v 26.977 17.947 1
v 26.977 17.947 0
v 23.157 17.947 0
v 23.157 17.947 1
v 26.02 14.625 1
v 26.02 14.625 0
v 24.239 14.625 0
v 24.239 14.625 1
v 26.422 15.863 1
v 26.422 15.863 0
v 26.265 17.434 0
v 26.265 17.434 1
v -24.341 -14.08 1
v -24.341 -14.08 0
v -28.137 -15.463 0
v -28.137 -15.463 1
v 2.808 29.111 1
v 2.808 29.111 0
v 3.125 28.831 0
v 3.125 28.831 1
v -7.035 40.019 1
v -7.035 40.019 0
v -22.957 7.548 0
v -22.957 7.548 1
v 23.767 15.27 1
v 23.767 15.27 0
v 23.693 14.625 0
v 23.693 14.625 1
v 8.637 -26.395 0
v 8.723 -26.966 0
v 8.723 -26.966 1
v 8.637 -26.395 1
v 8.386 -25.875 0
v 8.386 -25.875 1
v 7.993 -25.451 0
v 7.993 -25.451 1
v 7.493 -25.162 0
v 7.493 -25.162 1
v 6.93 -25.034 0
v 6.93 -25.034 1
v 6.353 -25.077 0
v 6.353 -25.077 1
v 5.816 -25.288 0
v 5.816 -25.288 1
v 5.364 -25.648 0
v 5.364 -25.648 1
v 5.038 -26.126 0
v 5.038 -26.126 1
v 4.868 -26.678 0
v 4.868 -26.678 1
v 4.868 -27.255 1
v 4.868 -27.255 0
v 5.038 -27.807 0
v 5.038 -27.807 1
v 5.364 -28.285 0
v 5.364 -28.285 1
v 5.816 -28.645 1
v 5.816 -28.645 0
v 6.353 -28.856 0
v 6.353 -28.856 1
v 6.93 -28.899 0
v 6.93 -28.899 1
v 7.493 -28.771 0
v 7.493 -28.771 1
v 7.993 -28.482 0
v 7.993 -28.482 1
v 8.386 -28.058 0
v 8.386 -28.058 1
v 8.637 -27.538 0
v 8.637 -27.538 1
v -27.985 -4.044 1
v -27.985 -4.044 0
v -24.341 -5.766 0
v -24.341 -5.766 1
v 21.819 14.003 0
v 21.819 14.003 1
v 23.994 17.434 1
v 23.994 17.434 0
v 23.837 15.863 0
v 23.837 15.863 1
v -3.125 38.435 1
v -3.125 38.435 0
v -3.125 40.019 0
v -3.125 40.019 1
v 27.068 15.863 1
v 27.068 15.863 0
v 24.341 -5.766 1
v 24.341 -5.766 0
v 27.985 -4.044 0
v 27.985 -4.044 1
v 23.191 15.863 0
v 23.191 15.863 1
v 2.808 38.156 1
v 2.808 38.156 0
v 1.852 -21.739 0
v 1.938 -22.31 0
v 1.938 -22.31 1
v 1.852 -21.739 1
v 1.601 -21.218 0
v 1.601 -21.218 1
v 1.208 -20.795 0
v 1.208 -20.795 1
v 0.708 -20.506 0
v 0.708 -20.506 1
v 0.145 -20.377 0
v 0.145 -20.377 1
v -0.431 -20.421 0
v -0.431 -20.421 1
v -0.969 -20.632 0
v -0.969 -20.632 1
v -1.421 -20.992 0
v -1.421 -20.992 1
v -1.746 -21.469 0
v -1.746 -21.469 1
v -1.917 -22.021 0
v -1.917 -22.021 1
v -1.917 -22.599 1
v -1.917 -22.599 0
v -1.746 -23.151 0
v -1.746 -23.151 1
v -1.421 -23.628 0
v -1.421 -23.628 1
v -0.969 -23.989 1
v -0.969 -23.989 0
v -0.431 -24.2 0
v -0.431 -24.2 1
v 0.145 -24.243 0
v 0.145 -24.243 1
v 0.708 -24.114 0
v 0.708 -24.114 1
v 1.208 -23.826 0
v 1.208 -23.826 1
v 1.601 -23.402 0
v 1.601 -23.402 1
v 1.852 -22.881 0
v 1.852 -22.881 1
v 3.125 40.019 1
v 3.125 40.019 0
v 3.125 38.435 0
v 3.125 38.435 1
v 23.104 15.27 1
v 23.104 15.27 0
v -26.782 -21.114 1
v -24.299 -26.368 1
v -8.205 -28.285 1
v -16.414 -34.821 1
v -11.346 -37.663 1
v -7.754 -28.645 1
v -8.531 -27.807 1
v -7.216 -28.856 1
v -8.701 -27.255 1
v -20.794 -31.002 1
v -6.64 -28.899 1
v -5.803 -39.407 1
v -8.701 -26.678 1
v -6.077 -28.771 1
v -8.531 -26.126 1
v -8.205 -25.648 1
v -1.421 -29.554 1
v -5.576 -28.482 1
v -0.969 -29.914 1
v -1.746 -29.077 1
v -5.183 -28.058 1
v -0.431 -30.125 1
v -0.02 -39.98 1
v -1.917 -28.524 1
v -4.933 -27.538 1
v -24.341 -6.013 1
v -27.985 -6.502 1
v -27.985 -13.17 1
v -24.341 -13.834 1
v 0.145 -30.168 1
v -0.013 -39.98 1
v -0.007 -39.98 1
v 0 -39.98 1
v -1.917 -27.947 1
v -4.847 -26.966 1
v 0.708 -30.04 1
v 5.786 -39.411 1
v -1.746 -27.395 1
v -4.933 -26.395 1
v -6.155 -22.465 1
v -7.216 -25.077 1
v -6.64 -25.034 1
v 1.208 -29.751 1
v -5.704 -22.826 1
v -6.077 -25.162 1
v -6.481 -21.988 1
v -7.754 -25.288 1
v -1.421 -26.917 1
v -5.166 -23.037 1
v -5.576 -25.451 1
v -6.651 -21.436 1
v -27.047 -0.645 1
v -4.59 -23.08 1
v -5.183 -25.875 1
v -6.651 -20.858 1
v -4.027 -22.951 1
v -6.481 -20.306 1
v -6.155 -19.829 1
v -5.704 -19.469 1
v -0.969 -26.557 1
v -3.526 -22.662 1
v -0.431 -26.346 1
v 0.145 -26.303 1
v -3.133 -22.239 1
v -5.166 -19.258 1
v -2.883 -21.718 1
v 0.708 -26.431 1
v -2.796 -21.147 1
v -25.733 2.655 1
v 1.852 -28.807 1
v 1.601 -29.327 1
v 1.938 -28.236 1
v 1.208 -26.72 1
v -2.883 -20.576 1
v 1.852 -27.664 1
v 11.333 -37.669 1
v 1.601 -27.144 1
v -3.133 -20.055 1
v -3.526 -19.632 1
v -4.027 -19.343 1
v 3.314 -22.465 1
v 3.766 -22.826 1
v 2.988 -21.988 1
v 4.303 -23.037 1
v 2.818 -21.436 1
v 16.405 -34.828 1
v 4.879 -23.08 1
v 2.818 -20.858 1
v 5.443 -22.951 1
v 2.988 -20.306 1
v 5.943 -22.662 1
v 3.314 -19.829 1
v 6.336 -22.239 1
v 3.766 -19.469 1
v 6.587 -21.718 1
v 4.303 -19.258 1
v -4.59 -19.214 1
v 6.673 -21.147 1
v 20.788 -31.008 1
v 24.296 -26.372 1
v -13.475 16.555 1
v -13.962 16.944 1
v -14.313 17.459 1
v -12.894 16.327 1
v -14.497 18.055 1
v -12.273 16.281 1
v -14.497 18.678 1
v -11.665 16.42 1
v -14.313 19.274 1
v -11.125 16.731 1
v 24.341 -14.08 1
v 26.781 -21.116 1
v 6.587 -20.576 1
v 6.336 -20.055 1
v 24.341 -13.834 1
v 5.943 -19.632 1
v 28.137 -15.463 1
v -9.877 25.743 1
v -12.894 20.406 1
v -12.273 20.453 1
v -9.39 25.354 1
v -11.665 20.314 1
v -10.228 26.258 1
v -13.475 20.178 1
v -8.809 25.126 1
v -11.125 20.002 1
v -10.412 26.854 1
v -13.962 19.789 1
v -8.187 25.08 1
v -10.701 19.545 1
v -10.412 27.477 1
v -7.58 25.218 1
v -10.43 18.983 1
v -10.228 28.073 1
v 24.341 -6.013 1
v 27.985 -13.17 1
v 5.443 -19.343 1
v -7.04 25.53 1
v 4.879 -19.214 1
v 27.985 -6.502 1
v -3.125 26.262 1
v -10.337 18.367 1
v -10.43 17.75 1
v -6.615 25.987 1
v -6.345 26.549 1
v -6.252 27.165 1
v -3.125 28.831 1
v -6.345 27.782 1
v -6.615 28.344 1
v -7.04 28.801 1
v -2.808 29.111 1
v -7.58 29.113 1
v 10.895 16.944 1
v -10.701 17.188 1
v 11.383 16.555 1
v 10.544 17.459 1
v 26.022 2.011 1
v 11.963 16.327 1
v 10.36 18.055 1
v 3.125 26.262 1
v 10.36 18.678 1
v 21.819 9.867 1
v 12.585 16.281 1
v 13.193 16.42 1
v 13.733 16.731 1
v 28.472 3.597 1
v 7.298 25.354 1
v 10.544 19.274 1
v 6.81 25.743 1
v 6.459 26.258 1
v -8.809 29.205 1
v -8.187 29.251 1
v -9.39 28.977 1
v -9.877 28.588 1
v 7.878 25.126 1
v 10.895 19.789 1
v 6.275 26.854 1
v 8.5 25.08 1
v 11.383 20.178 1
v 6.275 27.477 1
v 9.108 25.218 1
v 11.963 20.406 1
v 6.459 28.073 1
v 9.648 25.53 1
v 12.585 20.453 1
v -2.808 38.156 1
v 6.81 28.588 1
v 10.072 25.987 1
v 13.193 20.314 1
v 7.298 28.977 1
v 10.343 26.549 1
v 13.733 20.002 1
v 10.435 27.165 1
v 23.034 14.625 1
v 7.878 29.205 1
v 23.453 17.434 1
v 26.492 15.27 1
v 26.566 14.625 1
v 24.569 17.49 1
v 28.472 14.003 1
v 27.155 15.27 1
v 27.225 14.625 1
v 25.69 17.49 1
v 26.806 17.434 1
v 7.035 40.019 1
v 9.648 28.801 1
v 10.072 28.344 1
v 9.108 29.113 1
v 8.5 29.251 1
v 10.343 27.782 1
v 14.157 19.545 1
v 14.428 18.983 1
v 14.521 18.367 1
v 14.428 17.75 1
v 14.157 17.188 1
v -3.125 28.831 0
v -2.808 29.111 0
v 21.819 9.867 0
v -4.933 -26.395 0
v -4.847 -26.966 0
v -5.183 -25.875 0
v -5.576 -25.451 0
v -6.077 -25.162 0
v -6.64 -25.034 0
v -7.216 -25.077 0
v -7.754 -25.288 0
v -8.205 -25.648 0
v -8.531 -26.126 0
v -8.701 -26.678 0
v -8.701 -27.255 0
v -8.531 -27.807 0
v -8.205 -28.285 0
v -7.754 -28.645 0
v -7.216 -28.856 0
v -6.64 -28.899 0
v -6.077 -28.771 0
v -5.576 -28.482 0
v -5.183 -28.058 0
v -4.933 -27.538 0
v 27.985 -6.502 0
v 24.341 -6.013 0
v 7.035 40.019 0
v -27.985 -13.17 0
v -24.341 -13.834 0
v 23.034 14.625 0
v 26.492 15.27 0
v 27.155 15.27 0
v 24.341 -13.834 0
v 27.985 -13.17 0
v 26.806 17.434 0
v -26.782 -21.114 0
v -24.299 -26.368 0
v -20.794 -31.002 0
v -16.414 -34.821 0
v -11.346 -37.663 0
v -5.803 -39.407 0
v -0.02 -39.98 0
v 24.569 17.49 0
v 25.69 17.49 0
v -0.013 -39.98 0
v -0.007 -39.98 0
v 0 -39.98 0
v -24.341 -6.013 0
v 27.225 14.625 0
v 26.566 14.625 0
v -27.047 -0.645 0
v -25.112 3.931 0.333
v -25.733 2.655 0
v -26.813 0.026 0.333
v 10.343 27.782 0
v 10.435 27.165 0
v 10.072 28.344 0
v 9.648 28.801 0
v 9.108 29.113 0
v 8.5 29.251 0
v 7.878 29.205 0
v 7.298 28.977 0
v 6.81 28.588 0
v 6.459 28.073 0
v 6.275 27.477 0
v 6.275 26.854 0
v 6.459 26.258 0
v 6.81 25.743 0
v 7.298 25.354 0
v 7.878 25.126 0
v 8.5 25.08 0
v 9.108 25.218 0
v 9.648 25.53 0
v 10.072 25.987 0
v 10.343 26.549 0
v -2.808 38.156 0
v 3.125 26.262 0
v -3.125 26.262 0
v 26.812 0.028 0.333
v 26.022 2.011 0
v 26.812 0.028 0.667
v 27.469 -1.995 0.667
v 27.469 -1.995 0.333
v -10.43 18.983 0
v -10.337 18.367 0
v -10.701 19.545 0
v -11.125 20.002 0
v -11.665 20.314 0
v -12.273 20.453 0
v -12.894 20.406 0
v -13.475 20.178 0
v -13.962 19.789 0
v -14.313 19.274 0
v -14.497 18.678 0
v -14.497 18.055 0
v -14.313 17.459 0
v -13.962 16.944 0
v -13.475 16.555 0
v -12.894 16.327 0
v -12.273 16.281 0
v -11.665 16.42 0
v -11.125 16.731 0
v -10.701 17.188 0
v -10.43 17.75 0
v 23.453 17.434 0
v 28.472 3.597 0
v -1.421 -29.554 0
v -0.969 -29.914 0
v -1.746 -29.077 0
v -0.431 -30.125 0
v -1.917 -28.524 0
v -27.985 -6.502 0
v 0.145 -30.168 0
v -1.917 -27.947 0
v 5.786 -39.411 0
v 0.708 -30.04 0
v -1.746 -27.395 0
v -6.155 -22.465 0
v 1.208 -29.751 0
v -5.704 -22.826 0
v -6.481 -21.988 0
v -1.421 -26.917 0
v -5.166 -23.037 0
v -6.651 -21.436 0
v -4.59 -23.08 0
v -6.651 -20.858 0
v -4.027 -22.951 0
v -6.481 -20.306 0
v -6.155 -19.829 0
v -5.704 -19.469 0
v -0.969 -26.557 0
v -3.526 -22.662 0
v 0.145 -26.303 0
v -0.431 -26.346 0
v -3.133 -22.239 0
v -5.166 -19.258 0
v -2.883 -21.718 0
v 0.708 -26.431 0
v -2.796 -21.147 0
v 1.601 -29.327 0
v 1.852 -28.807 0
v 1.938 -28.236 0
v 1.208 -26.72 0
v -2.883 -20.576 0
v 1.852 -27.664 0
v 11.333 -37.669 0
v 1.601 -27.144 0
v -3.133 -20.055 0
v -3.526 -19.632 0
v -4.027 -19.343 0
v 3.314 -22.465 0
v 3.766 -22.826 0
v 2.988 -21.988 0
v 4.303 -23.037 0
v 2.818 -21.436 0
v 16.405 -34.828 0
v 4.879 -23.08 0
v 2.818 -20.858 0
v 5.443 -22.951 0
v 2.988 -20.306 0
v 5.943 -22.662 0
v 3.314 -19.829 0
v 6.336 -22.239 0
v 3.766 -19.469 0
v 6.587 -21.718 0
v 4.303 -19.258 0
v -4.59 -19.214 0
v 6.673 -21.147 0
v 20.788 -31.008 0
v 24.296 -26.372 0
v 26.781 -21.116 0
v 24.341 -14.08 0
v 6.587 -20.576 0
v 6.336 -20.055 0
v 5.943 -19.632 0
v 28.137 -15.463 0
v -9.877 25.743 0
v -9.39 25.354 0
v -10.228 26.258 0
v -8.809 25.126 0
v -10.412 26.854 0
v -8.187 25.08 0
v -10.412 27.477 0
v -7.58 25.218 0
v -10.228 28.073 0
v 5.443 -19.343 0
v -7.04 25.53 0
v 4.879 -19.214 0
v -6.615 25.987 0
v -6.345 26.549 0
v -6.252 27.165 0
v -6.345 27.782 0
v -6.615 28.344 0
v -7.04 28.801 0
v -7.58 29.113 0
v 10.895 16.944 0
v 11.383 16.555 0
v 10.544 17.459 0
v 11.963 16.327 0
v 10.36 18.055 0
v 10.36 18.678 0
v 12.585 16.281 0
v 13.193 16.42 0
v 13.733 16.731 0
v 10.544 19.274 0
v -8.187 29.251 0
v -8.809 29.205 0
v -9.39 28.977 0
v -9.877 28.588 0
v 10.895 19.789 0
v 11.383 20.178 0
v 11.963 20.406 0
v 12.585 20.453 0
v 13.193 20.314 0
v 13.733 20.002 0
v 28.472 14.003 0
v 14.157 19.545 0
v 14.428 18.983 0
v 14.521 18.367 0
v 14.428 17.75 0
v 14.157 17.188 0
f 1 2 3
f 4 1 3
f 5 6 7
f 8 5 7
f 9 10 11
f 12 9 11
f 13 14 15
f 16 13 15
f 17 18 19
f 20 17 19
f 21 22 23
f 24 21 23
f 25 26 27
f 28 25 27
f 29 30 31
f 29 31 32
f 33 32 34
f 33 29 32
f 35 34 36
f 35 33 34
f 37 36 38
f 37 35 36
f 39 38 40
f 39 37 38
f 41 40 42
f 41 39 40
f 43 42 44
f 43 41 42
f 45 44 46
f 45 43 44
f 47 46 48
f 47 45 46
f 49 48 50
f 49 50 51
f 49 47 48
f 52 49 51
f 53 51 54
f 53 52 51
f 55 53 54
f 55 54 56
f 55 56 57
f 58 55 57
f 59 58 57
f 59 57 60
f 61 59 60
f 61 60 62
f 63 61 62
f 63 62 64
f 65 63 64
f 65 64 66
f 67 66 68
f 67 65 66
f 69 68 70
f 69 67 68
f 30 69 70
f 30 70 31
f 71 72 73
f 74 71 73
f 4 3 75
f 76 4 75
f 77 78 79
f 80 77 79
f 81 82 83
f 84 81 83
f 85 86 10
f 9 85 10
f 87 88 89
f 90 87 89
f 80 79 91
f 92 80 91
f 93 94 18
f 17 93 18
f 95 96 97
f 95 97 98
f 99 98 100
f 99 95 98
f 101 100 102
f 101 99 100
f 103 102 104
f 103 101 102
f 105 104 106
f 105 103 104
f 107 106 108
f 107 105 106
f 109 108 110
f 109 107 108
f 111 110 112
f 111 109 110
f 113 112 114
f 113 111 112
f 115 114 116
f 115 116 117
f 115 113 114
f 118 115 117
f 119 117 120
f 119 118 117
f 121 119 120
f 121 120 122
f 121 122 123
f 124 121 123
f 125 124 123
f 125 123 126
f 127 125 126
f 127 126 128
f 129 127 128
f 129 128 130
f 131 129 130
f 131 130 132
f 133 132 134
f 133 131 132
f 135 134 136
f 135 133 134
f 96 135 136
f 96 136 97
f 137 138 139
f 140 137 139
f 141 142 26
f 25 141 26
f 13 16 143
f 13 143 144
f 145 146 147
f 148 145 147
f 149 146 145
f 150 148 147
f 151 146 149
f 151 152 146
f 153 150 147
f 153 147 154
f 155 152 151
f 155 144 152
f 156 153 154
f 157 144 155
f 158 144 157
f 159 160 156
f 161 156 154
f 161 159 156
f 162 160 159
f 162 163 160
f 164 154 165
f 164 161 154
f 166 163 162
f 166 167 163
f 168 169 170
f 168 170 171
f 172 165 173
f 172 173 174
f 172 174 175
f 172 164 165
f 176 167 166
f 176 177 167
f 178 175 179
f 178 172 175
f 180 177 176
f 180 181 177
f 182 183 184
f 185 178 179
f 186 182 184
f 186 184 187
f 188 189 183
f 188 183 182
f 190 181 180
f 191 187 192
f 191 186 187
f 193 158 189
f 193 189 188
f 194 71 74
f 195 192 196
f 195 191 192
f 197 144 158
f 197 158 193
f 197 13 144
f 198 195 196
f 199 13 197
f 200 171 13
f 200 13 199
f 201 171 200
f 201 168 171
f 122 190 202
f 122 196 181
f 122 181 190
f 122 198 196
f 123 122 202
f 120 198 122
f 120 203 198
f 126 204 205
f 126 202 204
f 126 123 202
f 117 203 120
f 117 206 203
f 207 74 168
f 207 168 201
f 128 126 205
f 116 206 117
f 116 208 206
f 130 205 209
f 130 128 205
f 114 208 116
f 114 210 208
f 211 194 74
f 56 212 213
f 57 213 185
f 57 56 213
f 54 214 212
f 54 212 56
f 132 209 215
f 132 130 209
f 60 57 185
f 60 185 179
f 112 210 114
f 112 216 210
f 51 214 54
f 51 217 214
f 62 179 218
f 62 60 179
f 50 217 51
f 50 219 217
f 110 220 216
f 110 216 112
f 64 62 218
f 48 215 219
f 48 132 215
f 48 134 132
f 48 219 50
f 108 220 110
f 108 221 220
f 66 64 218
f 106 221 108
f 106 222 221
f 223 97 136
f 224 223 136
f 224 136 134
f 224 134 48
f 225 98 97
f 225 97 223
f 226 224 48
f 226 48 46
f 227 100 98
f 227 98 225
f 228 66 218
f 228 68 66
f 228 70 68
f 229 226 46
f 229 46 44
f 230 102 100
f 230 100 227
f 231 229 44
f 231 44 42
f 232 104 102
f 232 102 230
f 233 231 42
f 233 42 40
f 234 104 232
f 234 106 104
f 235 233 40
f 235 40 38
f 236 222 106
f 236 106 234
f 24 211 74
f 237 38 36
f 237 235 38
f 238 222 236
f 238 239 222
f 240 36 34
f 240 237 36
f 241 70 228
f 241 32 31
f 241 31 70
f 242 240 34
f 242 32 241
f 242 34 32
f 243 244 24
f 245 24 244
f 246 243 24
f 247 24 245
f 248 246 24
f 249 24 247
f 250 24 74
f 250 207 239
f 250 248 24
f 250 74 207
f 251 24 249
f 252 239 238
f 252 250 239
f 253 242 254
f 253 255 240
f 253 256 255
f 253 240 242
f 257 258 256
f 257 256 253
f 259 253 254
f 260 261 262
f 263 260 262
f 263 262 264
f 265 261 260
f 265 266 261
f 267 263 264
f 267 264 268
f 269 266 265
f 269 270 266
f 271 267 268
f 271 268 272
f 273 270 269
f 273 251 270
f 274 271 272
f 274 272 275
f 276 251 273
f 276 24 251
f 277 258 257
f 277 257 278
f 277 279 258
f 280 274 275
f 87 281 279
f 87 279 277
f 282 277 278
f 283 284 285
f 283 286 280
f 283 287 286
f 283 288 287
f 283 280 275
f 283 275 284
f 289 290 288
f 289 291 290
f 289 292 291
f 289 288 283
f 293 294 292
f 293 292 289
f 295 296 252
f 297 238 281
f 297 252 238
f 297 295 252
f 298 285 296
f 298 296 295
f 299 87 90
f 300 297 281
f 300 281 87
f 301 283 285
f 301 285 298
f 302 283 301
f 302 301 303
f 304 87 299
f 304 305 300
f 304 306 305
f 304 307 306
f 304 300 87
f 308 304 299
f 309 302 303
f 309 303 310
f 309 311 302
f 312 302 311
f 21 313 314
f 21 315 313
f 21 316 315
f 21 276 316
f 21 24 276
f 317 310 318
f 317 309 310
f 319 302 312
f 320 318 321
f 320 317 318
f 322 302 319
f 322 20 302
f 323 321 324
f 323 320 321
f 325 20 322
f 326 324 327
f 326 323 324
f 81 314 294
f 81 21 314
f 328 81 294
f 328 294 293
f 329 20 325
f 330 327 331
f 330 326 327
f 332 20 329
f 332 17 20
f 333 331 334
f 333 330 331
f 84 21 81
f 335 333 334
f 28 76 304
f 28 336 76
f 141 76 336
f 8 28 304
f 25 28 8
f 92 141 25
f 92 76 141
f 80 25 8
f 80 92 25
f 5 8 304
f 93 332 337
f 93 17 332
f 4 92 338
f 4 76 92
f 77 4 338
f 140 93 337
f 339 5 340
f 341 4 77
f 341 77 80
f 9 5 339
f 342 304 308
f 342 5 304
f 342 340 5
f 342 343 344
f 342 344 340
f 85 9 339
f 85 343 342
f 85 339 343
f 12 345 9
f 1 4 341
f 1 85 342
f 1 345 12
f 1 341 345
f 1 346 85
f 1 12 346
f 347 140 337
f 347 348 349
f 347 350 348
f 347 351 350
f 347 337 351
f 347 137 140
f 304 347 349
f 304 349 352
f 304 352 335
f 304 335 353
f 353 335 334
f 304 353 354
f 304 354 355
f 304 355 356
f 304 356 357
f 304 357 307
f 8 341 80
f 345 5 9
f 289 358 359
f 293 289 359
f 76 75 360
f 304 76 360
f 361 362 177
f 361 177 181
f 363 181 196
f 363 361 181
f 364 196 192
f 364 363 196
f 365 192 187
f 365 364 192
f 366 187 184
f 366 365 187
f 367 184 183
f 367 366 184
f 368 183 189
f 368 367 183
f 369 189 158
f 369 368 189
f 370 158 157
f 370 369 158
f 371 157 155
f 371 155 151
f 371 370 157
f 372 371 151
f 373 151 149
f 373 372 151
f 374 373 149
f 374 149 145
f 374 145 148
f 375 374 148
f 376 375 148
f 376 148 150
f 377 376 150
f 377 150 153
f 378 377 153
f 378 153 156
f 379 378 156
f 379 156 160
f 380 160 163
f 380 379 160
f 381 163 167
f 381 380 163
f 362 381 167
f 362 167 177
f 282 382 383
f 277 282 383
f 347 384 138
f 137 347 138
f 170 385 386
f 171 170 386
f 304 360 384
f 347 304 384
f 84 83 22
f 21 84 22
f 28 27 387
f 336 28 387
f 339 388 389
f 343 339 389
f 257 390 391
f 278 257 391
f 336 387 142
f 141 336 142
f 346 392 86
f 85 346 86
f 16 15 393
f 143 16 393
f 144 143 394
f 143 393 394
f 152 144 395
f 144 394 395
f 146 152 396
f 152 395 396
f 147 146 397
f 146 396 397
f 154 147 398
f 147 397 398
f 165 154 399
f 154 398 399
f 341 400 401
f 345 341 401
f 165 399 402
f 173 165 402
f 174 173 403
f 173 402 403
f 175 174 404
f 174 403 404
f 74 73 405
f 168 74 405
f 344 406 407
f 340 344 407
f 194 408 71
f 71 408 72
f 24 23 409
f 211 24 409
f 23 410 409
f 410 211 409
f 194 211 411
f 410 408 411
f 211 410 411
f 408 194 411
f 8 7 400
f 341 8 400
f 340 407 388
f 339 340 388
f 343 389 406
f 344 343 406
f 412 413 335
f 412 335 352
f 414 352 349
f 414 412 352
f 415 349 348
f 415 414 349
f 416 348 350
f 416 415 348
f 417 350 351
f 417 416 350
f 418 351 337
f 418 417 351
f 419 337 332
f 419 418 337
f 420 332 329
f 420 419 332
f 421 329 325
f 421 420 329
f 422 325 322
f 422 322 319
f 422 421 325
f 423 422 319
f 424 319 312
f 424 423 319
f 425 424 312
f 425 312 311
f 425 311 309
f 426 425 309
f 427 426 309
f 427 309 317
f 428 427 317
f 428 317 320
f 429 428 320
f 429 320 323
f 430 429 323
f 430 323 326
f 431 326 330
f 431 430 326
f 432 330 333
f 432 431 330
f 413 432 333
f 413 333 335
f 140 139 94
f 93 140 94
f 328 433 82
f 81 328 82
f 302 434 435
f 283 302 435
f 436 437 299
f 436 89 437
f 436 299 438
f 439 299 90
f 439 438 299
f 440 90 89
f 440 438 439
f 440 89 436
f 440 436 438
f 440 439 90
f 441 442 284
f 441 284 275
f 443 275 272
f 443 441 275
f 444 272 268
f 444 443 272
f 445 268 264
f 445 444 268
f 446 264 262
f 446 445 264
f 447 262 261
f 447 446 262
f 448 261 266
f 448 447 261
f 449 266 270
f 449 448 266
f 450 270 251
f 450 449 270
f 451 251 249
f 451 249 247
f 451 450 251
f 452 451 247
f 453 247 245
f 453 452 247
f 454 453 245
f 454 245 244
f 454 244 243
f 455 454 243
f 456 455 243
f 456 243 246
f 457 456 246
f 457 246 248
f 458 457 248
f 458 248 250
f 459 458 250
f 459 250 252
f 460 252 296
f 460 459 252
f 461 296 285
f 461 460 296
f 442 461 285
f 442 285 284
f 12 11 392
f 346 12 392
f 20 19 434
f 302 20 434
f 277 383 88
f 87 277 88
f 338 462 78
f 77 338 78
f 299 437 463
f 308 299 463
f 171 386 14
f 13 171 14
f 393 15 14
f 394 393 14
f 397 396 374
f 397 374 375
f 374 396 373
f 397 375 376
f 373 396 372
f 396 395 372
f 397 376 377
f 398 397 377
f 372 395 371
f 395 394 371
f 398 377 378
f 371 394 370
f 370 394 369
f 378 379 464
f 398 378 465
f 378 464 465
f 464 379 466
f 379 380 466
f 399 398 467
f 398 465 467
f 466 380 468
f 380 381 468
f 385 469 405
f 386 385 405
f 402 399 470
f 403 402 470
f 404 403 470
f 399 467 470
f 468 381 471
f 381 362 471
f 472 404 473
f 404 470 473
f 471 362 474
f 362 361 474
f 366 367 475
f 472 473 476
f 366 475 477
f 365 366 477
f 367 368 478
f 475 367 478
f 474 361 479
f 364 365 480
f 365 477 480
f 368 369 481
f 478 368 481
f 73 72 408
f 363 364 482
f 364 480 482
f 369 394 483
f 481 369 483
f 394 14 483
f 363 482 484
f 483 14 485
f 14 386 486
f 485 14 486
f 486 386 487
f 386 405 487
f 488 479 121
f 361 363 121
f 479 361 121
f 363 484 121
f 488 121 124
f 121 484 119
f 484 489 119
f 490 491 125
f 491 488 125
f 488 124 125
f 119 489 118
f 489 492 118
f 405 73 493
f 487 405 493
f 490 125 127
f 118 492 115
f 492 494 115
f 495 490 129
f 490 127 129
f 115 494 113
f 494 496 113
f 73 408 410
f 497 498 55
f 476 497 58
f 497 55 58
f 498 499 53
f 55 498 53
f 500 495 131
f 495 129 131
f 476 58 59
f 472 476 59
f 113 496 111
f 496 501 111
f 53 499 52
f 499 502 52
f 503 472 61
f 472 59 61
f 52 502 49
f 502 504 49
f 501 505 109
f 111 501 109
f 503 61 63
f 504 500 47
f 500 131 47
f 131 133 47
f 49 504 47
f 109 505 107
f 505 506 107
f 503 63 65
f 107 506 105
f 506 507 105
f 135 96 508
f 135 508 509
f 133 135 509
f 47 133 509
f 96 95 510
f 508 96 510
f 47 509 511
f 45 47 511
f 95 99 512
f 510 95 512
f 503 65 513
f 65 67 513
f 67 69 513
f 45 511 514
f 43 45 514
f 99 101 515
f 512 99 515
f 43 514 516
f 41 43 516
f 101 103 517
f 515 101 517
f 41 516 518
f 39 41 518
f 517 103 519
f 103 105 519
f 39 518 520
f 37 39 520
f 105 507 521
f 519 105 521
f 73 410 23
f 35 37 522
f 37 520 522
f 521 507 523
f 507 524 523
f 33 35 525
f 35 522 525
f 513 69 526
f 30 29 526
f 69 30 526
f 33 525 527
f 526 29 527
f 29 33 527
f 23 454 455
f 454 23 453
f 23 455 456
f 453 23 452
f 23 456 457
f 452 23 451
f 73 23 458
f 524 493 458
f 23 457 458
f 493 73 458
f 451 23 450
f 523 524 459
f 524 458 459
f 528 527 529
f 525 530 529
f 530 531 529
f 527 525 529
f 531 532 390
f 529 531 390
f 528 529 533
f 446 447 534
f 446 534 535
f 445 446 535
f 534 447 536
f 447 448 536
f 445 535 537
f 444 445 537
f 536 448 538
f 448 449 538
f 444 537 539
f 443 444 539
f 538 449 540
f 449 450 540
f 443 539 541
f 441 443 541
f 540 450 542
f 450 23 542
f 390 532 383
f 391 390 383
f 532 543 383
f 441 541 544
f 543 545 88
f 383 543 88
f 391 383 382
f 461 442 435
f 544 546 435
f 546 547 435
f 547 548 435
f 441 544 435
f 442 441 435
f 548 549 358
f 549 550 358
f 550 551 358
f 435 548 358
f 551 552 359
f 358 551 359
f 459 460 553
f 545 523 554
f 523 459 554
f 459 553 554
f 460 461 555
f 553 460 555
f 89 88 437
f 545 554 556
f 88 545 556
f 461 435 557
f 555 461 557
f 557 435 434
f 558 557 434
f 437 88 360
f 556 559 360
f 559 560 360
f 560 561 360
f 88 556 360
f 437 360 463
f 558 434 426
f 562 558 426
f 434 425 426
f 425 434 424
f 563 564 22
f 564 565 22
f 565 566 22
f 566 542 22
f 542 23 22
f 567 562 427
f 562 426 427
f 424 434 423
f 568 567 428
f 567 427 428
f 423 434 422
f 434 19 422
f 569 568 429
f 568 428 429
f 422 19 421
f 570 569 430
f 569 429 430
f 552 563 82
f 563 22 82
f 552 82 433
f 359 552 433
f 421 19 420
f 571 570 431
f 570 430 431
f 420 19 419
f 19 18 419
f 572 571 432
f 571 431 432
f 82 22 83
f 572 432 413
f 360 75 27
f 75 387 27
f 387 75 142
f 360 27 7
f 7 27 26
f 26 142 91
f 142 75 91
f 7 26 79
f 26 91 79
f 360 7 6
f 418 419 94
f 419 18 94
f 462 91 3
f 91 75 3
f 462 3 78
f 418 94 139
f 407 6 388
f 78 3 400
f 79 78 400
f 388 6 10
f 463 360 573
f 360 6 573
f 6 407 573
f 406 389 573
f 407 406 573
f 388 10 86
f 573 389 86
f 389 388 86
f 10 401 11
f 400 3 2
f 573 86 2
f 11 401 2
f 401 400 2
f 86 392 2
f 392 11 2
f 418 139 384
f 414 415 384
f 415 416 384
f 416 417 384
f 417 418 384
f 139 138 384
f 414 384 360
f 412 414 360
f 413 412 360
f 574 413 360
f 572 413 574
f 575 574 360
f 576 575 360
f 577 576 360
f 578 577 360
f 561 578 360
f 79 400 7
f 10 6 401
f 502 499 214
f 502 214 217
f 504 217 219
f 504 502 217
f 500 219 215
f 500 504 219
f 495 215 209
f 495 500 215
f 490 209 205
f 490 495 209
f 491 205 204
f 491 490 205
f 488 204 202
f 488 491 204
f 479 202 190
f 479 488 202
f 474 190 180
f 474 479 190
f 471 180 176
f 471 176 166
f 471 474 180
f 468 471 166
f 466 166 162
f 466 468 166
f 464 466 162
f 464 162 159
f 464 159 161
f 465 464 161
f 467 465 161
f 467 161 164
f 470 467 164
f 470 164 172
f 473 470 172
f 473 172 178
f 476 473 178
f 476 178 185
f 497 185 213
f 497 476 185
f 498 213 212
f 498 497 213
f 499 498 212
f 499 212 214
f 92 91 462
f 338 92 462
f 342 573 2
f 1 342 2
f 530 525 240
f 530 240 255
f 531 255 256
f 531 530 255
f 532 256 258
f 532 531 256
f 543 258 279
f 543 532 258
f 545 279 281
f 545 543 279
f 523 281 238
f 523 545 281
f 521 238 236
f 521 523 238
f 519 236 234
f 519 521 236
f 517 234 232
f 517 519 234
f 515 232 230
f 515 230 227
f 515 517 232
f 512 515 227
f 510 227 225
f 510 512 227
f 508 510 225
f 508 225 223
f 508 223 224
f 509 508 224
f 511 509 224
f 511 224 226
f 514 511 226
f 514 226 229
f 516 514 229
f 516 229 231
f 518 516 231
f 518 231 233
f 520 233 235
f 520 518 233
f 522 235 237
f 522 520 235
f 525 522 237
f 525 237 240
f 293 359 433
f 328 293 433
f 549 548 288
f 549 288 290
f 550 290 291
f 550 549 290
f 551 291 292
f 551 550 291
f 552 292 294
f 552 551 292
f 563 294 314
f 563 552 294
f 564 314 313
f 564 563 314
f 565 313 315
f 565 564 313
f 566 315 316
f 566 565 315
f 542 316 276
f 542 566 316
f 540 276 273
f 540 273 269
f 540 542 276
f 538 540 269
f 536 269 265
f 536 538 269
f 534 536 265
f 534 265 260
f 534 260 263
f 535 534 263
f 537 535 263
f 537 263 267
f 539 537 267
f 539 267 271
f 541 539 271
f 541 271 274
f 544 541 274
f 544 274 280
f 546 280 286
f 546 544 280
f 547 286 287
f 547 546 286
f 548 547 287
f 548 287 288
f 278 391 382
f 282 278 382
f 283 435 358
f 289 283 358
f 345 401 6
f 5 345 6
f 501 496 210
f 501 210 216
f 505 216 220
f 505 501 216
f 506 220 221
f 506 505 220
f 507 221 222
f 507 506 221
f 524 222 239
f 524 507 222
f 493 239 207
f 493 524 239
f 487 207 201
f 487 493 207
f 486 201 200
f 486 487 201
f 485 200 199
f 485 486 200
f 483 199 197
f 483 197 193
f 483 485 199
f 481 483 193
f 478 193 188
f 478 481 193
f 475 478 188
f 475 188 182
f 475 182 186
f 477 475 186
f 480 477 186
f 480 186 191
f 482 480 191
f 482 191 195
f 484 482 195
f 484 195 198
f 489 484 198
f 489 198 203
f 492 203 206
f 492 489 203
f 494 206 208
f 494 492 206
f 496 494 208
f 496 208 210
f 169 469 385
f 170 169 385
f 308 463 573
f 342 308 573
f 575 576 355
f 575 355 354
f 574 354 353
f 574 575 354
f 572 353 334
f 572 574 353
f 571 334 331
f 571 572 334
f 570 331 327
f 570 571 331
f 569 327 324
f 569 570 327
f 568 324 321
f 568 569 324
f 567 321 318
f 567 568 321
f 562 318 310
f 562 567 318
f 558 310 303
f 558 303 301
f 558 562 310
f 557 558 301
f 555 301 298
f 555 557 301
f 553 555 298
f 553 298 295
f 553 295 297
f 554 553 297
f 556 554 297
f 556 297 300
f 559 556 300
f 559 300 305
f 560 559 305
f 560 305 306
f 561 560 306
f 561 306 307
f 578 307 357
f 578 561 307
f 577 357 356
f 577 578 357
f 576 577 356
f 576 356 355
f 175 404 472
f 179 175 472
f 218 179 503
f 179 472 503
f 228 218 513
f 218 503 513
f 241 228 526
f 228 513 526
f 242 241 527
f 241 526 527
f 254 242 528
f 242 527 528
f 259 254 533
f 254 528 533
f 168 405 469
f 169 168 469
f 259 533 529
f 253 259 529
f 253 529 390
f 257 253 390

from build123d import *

# Parameters (mm, degrees)
F0_R     = 1.9381566851
F0_R_2   = 2.0917368597
F1_DEPTH = 1


# Not quite as in the source:
# - a feature names something its author has since deleted; it is built from what else it names


with BuildPart() as f1:
    # F0 (on Top) → F1 (new body)
    with BuildSketch(Plane.XY):
        with BuildLine():
            Line((3.1245559464, 26.2624721611), (-1.08e-08, 26.2624721611))
            Line((-1.08e-08, 26.2624721611), (-3.124555968, 26.2624721611))
            Line((-3.124555968, 26.2624721611), (-3.124555968, 28.8313598976))
            Line((-3.124555968, 28.8313598976), (-3.124555968, 38.4353779081))
            Line((-3.124555968, 38.4353779081), (-3.124555968, 40.0192436593))
            Line((-3.124555968, 40.0192436593), (-7.0351105106, 40.0192436593))
            Line((-7.0351105106, 40.0192436593), (-22.9566536529, 7.5476728616))
            add(Edge.make_bspline(
                [(-22.9566536529, 7.5476728616), (-25.3127067939, 4.1178797379), (-27.103694983, 0.0661364302), (-27.9845091561, -4.0443276364)],
                knots=[0, 0, 0, 0, 12.635418731, 12.635418731, 12.635418731, 12.635418731], degree=3))
            Line((-27.9845091561, -4.0443276364), (-24.3406626732, -5.7663835679))
            Line((-24.3406626732, -5.7663835679), (-24.3406626732, -6.0127781864))
            Line((-24.3406626732, -6.0127781864), (-27.9845091561, -6.501597853))
            Line((-27.9845091561, -6.501597853), (-27.9845091561, -13.1704901951))
            Line((-27.9845091561, -13.1704901951), (-24.3406626732, -13.83388813))
            Line((-24.3406626732, -13.83388813), (-24.3406626732, -14.0802827486))
            Line((-24.3406626732, -14.0802827486), (-28.1370117447, -15.4628727929))
            ThreePointArc((-28.1370117447, -15.4628727929), (-18.7026452725, -33.0246464869), (-0.0200514, -39.9804967013))
            ThreePointArc((-0.0200514, -39.9804967013), (-0.0100256971, -39.9804519319), (-1.08e-08, -39.9804036034))
            ThreePointArc((-1.08e-08, -39.9804036034), (18.6950876239, -33.0312342783), (28.1370117231, -15.4628727929))
            Line((28.1370117231, -15.4628727929), (24.3406626516, -14.0802827486))
            Line((24.3406626516, -14.0802827486), (24.3406626516, -13.8338881301))
            Line((24.3406626516, -13.8338881301), (27.9845091345, -13.1704901951))
            Line((27.9845091345, -13.1704901951), (27.9845091345, -6.501597853))
            Line((27.9845091345, -6.501597853), (24.3406626516, -6.0127781865))
            Line((24.3406626516, -6.0127781865), (24.3406626516, -5.7663835679))
            Line((24.3406626516, -5.7663835679), (27.9845091345, -4.0443276364))
            add(Edge.make_bspline(
                [(26.0221502825, 2.0106991689), (26.8752917045, 0.0540824437), (27.5438186439, -1.9877730517), (27.9845091345, -4.0443276364)],
                knots=[6.3136438899, 6.3136438899, 6.3136438899, 6.3136438899, 12.635418731, 12.635418731, 12.635418731, 12.635418731], degree=3))
            add(Edge.make_bspline(
                [(22.9566536312, 7.5476728616), (24.1339221361, 5.8338798437), (25.1701061555, 3.9647993294), (26.0221502825, 2.0106991689)],
                knots=[0, 0, 0, 0, 6.3136438899, 6.3136438899, 6.3136438899, 6.3136438899], degree=3))
            Line((22.9566536312, 7.5476728616), (21.8193497392, 9.8671744024))
            Line((21.8193497392, 9.8671744024), (7.035110489, 40.0192436593))
            Line((7.035110489, 40.0192436593), (3.1245559464, 40.0192436593))
            Line((3.1245559464, 40.0192436593), (3.1245559464, 38.4353779081))
            Line((3.1245559464, 38.4353779081), (3.1245559464, 28.8313598976))
            Line((3.1245559464, 28.8313598976), (3.1245559464, 26.2624721611))
        make_face()
        with Locations((-6.7846685267, -26.966459513)):
            Circle(F0_R, mode=Mode.SUBTRACT)
        with Locations((-1.08e-08, -28.2356044358)):
            Circle(F0_R, mode=Mode.SUBTRACT)
        with Locations((-4.7346279243, -21.1471724542)):
            Circle(F0_R, mode=Mode.SUBTRACT)
        with Locations((-1.08e-08, -22.3102177961)):
            Circle(F0_R, mode=Mode.SUBTRACT)
        with Locations((6.784668505, -26.966459513)):
            Circle(F0_R, mode=Mode.SUBTRACT)
        with Locations((4.7346279027, -21.1471724542)):
            Circle(F0_R, mode=Mode.SUBTRACT)
        with Locations((-12.4288502443, 18.366707164)):
            Circle(F0_R_2, mode=Mode.SUBTRACT)
        with Locations((-8.3437176479, 27.1654560115)):
            Circle(F0_R_2, mode=Mode.SUBTRACT)
        with Locations((12.4288502227, 18.366707164)):
            Circle(F0_R_2, mode=Mode.SUBTRACT)
        with Locations((8.3437176263, 27.1654560115)):
            Circle(F0_R_2, mode=Mode.SUBTRACT)
        with BuildLine():
            Line((21.8193497392, 14.0026268734), (21.8193497392, 9.8671744024))
            Line((21.8193497392, 9.8671744024), (22.9566536312, 7.5476728616))
            add(Edge.make_bspline(
                [(22.9566536312, 7.5476728616), (24.1339221361, 5.8338798437), (25.1701061555, 3.9647993294), (26.0221502825, 2.0106991689)],
                knots=[0, 0, 0, 0, 6.3136438899, 6.3136438899, 6.3136438899, 6.3136438899], degree=3))
            Line((26.0221502825, 2.0106991689), (28.4720553036, 3.5966005617))
            Line((28.4720553036, 3.5966005617), (28.4720553036, 14.0026268734))
            Line((28.4720553036, 14.0026268734), (26.9772648538, 17.9472138793))
            Line((26.9772648538, 17.9472138793), (23.1570666214, 17.9472138793))
            Line((23.1570666214, 17.9472138793), (21.8193497392, 14.0026268734))
        make_face()
        Polygon((23.0341097003, 14.6254569428), (23.103940836, 15.2695124223), (23.7673383417, 15.2695124223), (23.6930889239, 14.6254569428), align=None, mode=Mode.SUBTRACT)
        Polygon((27.2249650291, 14.6254569428), (26.5659858056, 14.6254569428), (26.4917363877, 15.2695124223), (27.1551338935, 15.2695124223), align=None, mode=Mode.SUBTRACT)
        Polygon((23.1912288972, 15.8630787924), (23.4530965144, 17.4342844956), (23.9942903911, 17.4342844956), (23.8371694774, 15.8630787924), align=None, mode=Mode.SUBTRACT)
        Polygon((24.238699366, 14.6254569428), (24.5689903023, 17.4904718284), (25.6900844272, 17.4904718284), (26.0203753635, 14.6254569428), align=None, mode=Mode.SUBTRACT)
        Polygon((27.0678458323, 15.8630787924), (26.4219052521, 15.8630787924), (26.2647843384, 17.4342844956), (26.8059782151, 17.4342844956), align=None, mode=Mode.SUBTRACT)
        Polygon((-3.124555968, 38.4353779081), (-3.124555968, 28.8313598976), (-2.8081914709, 29.1106844403), (-2.8081914709, 38.1560533654), align=None)
        Polygon((2.8081914492, 29.1106844403), (3.1245559464, 28.8313598976), (3.1245559464, 38.4353779081), (2.8081914492, 38.1560533654), align=None)
    extrude(amount=F1_DEPTH)


solid = f1.part
